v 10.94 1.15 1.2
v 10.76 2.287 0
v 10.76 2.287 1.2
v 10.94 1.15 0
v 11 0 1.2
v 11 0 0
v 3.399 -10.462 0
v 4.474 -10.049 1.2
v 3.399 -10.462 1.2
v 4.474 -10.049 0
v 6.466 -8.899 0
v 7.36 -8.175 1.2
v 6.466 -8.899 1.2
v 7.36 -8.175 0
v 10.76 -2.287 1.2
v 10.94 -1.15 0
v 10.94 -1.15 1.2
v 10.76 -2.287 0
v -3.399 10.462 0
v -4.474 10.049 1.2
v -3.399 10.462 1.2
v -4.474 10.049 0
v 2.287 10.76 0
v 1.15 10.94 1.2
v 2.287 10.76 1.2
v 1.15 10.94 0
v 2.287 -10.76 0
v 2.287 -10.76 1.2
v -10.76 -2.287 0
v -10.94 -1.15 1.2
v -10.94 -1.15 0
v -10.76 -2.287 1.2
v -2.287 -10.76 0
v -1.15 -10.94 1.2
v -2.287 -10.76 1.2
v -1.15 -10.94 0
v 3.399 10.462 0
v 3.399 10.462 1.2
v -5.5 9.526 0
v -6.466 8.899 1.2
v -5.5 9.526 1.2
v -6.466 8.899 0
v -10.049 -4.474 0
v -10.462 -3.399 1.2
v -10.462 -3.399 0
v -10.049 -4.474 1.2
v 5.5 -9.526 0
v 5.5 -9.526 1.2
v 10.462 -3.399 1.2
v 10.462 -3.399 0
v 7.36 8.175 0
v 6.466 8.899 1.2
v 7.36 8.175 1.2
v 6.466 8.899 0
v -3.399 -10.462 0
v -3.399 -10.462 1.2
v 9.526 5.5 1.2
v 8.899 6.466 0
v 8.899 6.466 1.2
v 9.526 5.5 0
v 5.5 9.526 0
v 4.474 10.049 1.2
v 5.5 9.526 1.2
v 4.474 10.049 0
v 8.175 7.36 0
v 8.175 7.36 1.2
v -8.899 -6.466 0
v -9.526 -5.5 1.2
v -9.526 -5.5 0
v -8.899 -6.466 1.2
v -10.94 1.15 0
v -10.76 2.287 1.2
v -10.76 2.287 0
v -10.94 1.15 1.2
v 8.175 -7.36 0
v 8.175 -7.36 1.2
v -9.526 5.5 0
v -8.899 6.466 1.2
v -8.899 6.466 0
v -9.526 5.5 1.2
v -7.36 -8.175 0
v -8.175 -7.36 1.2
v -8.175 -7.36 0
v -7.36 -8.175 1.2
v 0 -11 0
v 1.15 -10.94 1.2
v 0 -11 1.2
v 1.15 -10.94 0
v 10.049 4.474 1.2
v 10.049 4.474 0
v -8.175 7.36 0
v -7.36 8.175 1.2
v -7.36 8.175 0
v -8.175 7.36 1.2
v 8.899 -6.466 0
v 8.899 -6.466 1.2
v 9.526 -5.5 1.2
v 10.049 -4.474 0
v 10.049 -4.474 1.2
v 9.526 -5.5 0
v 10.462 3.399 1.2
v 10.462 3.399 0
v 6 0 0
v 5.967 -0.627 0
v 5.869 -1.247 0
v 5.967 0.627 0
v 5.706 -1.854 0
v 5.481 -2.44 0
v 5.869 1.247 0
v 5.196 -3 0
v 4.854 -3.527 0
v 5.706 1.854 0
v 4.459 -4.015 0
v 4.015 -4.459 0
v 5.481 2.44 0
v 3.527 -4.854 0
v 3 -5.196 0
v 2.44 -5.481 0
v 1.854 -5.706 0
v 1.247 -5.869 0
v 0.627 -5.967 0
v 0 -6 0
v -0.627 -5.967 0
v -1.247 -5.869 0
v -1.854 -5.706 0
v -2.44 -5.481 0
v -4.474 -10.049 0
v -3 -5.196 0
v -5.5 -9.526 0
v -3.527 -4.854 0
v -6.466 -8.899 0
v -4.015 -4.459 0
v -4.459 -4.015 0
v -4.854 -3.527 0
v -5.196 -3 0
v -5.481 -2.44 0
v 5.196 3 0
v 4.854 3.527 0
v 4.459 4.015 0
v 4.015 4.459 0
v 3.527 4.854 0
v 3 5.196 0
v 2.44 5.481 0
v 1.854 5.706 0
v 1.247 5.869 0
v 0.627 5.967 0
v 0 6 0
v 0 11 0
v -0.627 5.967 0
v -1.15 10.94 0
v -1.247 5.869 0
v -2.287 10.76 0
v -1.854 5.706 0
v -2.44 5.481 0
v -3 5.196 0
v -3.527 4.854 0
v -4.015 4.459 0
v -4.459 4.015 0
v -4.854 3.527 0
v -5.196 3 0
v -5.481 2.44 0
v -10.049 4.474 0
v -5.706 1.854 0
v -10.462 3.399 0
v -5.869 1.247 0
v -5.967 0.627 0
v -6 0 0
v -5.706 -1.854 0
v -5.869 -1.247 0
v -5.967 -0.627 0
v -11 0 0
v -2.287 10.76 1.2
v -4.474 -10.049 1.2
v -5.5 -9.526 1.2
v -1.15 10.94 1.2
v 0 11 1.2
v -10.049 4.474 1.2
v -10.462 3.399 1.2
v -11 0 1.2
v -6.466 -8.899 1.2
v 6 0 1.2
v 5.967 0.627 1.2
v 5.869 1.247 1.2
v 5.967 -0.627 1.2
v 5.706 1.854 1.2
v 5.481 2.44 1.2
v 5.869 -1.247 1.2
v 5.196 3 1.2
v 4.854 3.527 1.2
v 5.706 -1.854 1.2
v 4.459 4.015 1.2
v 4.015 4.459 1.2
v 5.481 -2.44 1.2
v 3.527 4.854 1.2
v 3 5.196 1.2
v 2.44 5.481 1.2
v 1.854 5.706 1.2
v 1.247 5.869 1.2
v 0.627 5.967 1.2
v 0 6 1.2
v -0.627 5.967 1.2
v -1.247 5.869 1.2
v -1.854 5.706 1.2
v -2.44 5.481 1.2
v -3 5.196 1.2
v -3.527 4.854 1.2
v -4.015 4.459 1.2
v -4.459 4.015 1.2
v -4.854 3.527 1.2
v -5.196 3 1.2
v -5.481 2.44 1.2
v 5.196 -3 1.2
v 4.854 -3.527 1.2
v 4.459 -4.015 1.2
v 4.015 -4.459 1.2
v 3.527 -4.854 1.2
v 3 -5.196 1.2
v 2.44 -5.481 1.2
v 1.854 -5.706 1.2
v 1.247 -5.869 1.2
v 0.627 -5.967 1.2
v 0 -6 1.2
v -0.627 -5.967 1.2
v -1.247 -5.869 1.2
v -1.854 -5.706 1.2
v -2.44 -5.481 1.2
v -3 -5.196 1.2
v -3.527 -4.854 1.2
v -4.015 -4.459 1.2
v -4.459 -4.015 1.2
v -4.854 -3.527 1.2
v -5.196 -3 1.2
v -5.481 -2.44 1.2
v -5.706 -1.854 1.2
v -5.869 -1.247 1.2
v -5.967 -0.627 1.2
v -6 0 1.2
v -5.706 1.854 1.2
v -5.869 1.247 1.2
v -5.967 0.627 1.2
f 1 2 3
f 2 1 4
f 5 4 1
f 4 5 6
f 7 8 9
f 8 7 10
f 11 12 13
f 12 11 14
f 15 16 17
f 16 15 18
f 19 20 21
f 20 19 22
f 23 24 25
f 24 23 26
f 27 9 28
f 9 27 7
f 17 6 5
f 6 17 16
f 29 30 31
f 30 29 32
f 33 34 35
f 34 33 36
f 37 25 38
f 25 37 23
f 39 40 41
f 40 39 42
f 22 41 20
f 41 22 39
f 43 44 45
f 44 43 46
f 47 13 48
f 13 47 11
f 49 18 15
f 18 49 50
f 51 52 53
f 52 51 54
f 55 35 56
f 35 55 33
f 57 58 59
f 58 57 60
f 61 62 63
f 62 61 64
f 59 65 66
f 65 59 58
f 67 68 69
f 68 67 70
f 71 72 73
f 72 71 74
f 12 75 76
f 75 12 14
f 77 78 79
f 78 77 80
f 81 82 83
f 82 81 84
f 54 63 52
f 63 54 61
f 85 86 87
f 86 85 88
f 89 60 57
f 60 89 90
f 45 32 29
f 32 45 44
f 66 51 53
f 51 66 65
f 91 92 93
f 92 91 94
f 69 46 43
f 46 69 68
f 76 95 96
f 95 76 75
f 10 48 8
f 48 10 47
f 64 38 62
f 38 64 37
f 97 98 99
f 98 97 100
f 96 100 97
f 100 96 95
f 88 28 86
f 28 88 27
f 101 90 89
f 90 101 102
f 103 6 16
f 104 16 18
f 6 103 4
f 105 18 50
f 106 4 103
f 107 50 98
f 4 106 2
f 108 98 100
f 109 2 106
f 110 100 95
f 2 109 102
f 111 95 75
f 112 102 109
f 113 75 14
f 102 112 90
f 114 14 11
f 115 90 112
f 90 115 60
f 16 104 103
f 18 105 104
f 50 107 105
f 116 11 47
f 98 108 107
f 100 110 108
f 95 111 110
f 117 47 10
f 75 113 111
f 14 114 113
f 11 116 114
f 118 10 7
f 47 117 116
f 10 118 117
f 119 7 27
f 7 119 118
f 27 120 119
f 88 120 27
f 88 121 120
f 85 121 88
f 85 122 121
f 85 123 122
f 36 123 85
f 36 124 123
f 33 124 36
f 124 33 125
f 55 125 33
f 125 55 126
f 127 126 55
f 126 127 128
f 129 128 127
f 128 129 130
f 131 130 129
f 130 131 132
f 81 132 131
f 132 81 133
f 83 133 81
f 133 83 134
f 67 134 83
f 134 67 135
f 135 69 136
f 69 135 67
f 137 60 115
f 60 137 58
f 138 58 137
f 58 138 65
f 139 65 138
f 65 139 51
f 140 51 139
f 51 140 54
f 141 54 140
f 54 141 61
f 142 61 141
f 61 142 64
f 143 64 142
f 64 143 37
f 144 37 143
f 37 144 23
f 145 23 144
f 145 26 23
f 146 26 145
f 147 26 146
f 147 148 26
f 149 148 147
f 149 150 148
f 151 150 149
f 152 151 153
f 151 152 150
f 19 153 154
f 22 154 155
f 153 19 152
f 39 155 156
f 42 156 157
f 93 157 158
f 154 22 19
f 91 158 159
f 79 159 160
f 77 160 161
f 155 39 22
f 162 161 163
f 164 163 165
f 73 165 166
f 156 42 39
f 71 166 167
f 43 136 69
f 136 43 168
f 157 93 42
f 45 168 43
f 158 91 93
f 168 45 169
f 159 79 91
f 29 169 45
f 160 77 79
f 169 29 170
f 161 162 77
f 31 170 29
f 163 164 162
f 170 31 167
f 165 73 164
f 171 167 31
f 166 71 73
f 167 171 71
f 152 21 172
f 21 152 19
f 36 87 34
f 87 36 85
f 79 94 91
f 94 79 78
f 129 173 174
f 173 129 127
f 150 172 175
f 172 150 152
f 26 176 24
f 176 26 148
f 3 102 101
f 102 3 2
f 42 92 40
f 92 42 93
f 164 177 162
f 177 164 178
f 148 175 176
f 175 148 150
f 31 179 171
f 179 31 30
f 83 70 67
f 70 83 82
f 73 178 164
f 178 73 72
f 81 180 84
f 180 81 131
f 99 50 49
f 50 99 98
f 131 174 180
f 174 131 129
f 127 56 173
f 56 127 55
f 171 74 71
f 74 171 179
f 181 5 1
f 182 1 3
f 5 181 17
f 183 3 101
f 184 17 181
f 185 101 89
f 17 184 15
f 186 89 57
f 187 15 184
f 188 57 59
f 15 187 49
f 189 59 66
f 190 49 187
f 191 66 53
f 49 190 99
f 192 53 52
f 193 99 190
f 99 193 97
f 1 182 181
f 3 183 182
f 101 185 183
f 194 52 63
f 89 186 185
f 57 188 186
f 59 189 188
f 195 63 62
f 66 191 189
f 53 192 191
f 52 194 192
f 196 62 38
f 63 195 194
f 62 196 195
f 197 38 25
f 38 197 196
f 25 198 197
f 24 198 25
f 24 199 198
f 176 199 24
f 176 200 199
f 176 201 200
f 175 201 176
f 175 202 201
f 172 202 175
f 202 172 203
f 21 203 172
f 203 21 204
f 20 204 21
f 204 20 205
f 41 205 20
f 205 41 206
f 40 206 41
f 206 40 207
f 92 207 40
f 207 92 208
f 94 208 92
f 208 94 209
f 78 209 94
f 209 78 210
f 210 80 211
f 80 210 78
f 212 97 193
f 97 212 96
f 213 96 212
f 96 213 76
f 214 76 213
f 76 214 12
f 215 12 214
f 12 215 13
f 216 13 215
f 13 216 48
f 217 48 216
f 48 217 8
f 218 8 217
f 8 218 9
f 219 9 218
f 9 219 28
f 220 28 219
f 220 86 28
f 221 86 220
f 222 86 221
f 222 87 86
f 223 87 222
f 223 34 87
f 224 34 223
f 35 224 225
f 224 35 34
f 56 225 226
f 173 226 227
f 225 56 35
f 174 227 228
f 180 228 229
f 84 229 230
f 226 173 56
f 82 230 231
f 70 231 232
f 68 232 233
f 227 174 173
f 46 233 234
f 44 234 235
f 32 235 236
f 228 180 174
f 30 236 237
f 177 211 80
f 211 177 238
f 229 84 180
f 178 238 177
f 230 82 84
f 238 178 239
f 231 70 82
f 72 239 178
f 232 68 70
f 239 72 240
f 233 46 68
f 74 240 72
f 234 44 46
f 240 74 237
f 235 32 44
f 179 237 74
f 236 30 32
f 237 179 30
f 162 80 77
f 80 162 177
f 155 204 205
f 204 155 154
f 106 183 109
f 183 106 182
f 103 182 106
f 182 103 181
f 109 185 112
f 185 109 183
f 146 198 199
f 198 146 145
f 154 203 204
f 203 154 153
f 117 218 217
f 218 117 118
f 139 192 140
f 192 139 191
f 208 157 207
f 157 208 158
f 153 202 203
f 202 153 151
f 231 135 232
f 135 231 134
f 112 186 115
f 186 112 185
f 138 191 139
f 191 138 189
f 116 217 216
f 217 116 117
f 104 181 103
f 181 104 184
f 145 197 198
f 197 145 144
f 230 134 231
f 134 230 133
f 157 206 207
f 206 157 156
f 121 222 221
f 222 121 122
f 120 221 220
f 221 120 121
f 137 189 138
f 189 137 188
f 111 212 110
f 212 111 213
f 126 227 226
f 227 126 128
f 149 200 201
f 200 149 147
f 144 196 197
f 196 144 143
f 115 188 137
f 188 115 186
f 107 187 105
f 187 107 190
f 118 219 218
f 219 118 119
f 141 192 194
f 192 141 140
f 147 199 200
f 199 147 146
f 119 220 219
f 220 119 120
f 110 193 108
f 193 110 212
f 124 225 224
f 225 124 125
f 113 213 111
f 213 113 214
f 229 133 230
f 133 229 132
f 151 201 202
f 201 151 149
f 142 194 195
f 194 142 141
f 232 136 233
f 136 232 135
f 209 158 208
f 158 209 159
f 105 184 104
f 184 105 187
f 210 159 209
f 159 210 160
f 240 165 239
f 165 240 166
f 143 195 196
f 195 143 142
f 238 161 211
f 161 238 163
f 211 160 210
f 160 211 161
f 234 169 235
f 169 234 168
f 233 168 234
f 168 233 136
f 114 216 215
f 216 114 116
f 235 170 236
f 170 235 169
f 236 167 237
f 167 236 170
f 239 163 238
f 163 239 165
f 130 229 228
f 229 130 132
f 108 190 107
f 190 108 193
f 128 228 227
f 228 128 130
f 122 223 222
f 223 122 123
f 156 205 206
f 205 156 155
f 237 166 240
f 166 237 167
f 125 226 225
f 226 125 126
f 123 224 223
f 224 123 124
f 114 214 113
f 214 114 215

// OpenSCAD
// Precision shim ring.
$fn = 60;
eps = 0.02;
inner_d = 12;
outer_d = 22;
thickness = 1.2;
difference() {
    cylinder(d = outer_d, h = thickness);
    translate([0, 0, -eps]) cylinder(d = inner_d, h = thickness + 2 * eps);
}
